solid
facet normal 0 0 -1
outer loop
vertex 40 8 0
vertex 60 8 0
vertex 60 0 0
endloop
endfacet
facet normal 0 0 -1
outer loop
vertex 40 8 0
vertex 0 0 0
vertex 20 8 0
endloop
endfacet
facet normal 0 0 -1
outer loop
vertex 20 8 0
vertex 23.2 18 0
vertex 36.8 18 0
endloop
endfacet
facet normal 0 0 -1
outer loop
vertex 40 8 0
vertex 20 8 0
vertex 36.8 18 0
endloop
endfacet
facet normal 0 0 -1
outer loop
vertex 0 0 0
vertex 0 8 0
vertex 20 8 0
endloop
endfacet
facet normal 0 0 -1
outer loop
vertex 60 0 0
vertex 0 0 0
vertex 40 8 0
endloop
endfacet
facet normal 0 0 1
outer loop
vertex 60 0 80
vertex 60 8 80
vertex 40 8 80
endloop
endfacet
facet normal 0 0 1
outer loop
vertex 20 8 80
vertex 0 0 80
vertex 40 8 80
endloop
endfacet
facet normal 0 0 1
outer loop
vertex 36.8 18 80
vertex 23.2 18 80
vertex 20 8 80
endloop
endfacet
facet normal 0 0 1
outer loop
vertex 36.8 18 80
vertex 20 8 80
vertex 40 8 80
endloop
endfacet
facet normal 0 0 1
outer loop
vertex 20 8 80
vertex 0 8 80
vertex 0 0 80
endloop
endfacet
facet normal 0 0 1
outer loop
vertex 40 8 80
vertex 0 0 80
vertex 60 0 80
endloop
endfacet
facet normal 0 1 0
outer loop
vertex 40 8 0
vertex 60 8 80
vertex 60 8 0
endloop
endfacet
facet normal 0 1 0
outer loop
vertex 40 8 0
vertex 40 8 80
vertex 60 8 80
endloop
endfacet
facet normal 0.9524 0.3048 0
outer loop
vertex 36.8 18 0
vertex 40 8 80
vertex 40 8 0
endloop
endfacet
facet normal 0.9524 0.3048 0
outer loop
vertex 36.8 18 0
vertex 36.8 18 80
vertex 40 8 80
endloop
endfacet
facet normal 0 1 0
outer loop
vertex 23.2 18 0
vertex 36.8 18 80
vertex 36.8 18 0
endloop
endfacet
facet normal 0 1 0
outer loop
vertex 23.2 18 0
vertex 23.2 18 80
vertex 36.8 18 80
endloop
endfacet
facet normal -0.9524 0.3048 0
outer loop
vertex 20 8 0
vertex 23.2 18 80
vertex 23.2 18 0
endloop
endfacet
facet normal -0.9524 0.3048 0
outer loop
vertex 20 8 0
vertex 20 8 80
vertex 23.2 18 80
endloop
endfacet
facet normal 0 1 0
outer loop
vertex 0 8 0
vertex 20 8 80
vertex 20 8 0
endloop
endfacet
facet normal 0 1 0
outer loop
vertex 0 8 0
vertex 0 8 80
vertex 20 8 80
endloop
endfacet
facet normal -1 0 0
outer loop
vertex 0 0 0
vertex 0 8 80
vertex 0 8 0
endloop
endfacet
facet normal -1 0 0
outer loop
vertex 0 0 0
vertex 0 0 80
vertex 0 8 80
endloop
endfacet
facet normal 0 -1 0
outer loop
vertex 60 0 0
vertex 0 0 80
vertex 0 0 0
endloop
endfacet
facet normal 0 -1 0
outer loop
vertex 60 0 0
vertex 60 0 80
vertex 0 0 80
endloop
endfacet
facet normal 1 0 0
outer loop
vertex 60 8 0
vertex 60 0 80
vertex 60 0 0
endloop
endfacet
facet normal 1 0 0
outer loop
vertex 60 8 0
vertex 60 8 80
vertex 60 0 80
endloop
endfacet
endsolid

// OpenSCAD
$fn = 32;
// target_bbox: 60, 18, 80
// ----------------------------------------------------------------------
// V guide rail: dovetail, 60 mm wide
// ----------------------------------------------------------------------

// --- parameters (mm) ---
rail_w = 60;              // rail width, X
base_t = 8;               // base plate thickness
v_depth = 10;             // V feature depth / height
v_half_w = 10;            // half width of the V at the base face
plate_t = 80;             // rail length, Z (the extrusion height)
top_half_w = 6.8;         // half width at the dovetail top

dovetail_base = 2 * v_half_w;  // dovetail width at the base
dovetail_top = 2 * top_half_w;  // dovetail width at the top

profile = [[0, 0], [60, 0], [60, 8], [40, 8], [36.8, 18], [23.2, 18], [20, 8], [0, 8]];  // primary outline, 8 points, counter clockwise

// --- the one profile operation ---
linear_extrude(height = plate_t) polygon(points = profile);
